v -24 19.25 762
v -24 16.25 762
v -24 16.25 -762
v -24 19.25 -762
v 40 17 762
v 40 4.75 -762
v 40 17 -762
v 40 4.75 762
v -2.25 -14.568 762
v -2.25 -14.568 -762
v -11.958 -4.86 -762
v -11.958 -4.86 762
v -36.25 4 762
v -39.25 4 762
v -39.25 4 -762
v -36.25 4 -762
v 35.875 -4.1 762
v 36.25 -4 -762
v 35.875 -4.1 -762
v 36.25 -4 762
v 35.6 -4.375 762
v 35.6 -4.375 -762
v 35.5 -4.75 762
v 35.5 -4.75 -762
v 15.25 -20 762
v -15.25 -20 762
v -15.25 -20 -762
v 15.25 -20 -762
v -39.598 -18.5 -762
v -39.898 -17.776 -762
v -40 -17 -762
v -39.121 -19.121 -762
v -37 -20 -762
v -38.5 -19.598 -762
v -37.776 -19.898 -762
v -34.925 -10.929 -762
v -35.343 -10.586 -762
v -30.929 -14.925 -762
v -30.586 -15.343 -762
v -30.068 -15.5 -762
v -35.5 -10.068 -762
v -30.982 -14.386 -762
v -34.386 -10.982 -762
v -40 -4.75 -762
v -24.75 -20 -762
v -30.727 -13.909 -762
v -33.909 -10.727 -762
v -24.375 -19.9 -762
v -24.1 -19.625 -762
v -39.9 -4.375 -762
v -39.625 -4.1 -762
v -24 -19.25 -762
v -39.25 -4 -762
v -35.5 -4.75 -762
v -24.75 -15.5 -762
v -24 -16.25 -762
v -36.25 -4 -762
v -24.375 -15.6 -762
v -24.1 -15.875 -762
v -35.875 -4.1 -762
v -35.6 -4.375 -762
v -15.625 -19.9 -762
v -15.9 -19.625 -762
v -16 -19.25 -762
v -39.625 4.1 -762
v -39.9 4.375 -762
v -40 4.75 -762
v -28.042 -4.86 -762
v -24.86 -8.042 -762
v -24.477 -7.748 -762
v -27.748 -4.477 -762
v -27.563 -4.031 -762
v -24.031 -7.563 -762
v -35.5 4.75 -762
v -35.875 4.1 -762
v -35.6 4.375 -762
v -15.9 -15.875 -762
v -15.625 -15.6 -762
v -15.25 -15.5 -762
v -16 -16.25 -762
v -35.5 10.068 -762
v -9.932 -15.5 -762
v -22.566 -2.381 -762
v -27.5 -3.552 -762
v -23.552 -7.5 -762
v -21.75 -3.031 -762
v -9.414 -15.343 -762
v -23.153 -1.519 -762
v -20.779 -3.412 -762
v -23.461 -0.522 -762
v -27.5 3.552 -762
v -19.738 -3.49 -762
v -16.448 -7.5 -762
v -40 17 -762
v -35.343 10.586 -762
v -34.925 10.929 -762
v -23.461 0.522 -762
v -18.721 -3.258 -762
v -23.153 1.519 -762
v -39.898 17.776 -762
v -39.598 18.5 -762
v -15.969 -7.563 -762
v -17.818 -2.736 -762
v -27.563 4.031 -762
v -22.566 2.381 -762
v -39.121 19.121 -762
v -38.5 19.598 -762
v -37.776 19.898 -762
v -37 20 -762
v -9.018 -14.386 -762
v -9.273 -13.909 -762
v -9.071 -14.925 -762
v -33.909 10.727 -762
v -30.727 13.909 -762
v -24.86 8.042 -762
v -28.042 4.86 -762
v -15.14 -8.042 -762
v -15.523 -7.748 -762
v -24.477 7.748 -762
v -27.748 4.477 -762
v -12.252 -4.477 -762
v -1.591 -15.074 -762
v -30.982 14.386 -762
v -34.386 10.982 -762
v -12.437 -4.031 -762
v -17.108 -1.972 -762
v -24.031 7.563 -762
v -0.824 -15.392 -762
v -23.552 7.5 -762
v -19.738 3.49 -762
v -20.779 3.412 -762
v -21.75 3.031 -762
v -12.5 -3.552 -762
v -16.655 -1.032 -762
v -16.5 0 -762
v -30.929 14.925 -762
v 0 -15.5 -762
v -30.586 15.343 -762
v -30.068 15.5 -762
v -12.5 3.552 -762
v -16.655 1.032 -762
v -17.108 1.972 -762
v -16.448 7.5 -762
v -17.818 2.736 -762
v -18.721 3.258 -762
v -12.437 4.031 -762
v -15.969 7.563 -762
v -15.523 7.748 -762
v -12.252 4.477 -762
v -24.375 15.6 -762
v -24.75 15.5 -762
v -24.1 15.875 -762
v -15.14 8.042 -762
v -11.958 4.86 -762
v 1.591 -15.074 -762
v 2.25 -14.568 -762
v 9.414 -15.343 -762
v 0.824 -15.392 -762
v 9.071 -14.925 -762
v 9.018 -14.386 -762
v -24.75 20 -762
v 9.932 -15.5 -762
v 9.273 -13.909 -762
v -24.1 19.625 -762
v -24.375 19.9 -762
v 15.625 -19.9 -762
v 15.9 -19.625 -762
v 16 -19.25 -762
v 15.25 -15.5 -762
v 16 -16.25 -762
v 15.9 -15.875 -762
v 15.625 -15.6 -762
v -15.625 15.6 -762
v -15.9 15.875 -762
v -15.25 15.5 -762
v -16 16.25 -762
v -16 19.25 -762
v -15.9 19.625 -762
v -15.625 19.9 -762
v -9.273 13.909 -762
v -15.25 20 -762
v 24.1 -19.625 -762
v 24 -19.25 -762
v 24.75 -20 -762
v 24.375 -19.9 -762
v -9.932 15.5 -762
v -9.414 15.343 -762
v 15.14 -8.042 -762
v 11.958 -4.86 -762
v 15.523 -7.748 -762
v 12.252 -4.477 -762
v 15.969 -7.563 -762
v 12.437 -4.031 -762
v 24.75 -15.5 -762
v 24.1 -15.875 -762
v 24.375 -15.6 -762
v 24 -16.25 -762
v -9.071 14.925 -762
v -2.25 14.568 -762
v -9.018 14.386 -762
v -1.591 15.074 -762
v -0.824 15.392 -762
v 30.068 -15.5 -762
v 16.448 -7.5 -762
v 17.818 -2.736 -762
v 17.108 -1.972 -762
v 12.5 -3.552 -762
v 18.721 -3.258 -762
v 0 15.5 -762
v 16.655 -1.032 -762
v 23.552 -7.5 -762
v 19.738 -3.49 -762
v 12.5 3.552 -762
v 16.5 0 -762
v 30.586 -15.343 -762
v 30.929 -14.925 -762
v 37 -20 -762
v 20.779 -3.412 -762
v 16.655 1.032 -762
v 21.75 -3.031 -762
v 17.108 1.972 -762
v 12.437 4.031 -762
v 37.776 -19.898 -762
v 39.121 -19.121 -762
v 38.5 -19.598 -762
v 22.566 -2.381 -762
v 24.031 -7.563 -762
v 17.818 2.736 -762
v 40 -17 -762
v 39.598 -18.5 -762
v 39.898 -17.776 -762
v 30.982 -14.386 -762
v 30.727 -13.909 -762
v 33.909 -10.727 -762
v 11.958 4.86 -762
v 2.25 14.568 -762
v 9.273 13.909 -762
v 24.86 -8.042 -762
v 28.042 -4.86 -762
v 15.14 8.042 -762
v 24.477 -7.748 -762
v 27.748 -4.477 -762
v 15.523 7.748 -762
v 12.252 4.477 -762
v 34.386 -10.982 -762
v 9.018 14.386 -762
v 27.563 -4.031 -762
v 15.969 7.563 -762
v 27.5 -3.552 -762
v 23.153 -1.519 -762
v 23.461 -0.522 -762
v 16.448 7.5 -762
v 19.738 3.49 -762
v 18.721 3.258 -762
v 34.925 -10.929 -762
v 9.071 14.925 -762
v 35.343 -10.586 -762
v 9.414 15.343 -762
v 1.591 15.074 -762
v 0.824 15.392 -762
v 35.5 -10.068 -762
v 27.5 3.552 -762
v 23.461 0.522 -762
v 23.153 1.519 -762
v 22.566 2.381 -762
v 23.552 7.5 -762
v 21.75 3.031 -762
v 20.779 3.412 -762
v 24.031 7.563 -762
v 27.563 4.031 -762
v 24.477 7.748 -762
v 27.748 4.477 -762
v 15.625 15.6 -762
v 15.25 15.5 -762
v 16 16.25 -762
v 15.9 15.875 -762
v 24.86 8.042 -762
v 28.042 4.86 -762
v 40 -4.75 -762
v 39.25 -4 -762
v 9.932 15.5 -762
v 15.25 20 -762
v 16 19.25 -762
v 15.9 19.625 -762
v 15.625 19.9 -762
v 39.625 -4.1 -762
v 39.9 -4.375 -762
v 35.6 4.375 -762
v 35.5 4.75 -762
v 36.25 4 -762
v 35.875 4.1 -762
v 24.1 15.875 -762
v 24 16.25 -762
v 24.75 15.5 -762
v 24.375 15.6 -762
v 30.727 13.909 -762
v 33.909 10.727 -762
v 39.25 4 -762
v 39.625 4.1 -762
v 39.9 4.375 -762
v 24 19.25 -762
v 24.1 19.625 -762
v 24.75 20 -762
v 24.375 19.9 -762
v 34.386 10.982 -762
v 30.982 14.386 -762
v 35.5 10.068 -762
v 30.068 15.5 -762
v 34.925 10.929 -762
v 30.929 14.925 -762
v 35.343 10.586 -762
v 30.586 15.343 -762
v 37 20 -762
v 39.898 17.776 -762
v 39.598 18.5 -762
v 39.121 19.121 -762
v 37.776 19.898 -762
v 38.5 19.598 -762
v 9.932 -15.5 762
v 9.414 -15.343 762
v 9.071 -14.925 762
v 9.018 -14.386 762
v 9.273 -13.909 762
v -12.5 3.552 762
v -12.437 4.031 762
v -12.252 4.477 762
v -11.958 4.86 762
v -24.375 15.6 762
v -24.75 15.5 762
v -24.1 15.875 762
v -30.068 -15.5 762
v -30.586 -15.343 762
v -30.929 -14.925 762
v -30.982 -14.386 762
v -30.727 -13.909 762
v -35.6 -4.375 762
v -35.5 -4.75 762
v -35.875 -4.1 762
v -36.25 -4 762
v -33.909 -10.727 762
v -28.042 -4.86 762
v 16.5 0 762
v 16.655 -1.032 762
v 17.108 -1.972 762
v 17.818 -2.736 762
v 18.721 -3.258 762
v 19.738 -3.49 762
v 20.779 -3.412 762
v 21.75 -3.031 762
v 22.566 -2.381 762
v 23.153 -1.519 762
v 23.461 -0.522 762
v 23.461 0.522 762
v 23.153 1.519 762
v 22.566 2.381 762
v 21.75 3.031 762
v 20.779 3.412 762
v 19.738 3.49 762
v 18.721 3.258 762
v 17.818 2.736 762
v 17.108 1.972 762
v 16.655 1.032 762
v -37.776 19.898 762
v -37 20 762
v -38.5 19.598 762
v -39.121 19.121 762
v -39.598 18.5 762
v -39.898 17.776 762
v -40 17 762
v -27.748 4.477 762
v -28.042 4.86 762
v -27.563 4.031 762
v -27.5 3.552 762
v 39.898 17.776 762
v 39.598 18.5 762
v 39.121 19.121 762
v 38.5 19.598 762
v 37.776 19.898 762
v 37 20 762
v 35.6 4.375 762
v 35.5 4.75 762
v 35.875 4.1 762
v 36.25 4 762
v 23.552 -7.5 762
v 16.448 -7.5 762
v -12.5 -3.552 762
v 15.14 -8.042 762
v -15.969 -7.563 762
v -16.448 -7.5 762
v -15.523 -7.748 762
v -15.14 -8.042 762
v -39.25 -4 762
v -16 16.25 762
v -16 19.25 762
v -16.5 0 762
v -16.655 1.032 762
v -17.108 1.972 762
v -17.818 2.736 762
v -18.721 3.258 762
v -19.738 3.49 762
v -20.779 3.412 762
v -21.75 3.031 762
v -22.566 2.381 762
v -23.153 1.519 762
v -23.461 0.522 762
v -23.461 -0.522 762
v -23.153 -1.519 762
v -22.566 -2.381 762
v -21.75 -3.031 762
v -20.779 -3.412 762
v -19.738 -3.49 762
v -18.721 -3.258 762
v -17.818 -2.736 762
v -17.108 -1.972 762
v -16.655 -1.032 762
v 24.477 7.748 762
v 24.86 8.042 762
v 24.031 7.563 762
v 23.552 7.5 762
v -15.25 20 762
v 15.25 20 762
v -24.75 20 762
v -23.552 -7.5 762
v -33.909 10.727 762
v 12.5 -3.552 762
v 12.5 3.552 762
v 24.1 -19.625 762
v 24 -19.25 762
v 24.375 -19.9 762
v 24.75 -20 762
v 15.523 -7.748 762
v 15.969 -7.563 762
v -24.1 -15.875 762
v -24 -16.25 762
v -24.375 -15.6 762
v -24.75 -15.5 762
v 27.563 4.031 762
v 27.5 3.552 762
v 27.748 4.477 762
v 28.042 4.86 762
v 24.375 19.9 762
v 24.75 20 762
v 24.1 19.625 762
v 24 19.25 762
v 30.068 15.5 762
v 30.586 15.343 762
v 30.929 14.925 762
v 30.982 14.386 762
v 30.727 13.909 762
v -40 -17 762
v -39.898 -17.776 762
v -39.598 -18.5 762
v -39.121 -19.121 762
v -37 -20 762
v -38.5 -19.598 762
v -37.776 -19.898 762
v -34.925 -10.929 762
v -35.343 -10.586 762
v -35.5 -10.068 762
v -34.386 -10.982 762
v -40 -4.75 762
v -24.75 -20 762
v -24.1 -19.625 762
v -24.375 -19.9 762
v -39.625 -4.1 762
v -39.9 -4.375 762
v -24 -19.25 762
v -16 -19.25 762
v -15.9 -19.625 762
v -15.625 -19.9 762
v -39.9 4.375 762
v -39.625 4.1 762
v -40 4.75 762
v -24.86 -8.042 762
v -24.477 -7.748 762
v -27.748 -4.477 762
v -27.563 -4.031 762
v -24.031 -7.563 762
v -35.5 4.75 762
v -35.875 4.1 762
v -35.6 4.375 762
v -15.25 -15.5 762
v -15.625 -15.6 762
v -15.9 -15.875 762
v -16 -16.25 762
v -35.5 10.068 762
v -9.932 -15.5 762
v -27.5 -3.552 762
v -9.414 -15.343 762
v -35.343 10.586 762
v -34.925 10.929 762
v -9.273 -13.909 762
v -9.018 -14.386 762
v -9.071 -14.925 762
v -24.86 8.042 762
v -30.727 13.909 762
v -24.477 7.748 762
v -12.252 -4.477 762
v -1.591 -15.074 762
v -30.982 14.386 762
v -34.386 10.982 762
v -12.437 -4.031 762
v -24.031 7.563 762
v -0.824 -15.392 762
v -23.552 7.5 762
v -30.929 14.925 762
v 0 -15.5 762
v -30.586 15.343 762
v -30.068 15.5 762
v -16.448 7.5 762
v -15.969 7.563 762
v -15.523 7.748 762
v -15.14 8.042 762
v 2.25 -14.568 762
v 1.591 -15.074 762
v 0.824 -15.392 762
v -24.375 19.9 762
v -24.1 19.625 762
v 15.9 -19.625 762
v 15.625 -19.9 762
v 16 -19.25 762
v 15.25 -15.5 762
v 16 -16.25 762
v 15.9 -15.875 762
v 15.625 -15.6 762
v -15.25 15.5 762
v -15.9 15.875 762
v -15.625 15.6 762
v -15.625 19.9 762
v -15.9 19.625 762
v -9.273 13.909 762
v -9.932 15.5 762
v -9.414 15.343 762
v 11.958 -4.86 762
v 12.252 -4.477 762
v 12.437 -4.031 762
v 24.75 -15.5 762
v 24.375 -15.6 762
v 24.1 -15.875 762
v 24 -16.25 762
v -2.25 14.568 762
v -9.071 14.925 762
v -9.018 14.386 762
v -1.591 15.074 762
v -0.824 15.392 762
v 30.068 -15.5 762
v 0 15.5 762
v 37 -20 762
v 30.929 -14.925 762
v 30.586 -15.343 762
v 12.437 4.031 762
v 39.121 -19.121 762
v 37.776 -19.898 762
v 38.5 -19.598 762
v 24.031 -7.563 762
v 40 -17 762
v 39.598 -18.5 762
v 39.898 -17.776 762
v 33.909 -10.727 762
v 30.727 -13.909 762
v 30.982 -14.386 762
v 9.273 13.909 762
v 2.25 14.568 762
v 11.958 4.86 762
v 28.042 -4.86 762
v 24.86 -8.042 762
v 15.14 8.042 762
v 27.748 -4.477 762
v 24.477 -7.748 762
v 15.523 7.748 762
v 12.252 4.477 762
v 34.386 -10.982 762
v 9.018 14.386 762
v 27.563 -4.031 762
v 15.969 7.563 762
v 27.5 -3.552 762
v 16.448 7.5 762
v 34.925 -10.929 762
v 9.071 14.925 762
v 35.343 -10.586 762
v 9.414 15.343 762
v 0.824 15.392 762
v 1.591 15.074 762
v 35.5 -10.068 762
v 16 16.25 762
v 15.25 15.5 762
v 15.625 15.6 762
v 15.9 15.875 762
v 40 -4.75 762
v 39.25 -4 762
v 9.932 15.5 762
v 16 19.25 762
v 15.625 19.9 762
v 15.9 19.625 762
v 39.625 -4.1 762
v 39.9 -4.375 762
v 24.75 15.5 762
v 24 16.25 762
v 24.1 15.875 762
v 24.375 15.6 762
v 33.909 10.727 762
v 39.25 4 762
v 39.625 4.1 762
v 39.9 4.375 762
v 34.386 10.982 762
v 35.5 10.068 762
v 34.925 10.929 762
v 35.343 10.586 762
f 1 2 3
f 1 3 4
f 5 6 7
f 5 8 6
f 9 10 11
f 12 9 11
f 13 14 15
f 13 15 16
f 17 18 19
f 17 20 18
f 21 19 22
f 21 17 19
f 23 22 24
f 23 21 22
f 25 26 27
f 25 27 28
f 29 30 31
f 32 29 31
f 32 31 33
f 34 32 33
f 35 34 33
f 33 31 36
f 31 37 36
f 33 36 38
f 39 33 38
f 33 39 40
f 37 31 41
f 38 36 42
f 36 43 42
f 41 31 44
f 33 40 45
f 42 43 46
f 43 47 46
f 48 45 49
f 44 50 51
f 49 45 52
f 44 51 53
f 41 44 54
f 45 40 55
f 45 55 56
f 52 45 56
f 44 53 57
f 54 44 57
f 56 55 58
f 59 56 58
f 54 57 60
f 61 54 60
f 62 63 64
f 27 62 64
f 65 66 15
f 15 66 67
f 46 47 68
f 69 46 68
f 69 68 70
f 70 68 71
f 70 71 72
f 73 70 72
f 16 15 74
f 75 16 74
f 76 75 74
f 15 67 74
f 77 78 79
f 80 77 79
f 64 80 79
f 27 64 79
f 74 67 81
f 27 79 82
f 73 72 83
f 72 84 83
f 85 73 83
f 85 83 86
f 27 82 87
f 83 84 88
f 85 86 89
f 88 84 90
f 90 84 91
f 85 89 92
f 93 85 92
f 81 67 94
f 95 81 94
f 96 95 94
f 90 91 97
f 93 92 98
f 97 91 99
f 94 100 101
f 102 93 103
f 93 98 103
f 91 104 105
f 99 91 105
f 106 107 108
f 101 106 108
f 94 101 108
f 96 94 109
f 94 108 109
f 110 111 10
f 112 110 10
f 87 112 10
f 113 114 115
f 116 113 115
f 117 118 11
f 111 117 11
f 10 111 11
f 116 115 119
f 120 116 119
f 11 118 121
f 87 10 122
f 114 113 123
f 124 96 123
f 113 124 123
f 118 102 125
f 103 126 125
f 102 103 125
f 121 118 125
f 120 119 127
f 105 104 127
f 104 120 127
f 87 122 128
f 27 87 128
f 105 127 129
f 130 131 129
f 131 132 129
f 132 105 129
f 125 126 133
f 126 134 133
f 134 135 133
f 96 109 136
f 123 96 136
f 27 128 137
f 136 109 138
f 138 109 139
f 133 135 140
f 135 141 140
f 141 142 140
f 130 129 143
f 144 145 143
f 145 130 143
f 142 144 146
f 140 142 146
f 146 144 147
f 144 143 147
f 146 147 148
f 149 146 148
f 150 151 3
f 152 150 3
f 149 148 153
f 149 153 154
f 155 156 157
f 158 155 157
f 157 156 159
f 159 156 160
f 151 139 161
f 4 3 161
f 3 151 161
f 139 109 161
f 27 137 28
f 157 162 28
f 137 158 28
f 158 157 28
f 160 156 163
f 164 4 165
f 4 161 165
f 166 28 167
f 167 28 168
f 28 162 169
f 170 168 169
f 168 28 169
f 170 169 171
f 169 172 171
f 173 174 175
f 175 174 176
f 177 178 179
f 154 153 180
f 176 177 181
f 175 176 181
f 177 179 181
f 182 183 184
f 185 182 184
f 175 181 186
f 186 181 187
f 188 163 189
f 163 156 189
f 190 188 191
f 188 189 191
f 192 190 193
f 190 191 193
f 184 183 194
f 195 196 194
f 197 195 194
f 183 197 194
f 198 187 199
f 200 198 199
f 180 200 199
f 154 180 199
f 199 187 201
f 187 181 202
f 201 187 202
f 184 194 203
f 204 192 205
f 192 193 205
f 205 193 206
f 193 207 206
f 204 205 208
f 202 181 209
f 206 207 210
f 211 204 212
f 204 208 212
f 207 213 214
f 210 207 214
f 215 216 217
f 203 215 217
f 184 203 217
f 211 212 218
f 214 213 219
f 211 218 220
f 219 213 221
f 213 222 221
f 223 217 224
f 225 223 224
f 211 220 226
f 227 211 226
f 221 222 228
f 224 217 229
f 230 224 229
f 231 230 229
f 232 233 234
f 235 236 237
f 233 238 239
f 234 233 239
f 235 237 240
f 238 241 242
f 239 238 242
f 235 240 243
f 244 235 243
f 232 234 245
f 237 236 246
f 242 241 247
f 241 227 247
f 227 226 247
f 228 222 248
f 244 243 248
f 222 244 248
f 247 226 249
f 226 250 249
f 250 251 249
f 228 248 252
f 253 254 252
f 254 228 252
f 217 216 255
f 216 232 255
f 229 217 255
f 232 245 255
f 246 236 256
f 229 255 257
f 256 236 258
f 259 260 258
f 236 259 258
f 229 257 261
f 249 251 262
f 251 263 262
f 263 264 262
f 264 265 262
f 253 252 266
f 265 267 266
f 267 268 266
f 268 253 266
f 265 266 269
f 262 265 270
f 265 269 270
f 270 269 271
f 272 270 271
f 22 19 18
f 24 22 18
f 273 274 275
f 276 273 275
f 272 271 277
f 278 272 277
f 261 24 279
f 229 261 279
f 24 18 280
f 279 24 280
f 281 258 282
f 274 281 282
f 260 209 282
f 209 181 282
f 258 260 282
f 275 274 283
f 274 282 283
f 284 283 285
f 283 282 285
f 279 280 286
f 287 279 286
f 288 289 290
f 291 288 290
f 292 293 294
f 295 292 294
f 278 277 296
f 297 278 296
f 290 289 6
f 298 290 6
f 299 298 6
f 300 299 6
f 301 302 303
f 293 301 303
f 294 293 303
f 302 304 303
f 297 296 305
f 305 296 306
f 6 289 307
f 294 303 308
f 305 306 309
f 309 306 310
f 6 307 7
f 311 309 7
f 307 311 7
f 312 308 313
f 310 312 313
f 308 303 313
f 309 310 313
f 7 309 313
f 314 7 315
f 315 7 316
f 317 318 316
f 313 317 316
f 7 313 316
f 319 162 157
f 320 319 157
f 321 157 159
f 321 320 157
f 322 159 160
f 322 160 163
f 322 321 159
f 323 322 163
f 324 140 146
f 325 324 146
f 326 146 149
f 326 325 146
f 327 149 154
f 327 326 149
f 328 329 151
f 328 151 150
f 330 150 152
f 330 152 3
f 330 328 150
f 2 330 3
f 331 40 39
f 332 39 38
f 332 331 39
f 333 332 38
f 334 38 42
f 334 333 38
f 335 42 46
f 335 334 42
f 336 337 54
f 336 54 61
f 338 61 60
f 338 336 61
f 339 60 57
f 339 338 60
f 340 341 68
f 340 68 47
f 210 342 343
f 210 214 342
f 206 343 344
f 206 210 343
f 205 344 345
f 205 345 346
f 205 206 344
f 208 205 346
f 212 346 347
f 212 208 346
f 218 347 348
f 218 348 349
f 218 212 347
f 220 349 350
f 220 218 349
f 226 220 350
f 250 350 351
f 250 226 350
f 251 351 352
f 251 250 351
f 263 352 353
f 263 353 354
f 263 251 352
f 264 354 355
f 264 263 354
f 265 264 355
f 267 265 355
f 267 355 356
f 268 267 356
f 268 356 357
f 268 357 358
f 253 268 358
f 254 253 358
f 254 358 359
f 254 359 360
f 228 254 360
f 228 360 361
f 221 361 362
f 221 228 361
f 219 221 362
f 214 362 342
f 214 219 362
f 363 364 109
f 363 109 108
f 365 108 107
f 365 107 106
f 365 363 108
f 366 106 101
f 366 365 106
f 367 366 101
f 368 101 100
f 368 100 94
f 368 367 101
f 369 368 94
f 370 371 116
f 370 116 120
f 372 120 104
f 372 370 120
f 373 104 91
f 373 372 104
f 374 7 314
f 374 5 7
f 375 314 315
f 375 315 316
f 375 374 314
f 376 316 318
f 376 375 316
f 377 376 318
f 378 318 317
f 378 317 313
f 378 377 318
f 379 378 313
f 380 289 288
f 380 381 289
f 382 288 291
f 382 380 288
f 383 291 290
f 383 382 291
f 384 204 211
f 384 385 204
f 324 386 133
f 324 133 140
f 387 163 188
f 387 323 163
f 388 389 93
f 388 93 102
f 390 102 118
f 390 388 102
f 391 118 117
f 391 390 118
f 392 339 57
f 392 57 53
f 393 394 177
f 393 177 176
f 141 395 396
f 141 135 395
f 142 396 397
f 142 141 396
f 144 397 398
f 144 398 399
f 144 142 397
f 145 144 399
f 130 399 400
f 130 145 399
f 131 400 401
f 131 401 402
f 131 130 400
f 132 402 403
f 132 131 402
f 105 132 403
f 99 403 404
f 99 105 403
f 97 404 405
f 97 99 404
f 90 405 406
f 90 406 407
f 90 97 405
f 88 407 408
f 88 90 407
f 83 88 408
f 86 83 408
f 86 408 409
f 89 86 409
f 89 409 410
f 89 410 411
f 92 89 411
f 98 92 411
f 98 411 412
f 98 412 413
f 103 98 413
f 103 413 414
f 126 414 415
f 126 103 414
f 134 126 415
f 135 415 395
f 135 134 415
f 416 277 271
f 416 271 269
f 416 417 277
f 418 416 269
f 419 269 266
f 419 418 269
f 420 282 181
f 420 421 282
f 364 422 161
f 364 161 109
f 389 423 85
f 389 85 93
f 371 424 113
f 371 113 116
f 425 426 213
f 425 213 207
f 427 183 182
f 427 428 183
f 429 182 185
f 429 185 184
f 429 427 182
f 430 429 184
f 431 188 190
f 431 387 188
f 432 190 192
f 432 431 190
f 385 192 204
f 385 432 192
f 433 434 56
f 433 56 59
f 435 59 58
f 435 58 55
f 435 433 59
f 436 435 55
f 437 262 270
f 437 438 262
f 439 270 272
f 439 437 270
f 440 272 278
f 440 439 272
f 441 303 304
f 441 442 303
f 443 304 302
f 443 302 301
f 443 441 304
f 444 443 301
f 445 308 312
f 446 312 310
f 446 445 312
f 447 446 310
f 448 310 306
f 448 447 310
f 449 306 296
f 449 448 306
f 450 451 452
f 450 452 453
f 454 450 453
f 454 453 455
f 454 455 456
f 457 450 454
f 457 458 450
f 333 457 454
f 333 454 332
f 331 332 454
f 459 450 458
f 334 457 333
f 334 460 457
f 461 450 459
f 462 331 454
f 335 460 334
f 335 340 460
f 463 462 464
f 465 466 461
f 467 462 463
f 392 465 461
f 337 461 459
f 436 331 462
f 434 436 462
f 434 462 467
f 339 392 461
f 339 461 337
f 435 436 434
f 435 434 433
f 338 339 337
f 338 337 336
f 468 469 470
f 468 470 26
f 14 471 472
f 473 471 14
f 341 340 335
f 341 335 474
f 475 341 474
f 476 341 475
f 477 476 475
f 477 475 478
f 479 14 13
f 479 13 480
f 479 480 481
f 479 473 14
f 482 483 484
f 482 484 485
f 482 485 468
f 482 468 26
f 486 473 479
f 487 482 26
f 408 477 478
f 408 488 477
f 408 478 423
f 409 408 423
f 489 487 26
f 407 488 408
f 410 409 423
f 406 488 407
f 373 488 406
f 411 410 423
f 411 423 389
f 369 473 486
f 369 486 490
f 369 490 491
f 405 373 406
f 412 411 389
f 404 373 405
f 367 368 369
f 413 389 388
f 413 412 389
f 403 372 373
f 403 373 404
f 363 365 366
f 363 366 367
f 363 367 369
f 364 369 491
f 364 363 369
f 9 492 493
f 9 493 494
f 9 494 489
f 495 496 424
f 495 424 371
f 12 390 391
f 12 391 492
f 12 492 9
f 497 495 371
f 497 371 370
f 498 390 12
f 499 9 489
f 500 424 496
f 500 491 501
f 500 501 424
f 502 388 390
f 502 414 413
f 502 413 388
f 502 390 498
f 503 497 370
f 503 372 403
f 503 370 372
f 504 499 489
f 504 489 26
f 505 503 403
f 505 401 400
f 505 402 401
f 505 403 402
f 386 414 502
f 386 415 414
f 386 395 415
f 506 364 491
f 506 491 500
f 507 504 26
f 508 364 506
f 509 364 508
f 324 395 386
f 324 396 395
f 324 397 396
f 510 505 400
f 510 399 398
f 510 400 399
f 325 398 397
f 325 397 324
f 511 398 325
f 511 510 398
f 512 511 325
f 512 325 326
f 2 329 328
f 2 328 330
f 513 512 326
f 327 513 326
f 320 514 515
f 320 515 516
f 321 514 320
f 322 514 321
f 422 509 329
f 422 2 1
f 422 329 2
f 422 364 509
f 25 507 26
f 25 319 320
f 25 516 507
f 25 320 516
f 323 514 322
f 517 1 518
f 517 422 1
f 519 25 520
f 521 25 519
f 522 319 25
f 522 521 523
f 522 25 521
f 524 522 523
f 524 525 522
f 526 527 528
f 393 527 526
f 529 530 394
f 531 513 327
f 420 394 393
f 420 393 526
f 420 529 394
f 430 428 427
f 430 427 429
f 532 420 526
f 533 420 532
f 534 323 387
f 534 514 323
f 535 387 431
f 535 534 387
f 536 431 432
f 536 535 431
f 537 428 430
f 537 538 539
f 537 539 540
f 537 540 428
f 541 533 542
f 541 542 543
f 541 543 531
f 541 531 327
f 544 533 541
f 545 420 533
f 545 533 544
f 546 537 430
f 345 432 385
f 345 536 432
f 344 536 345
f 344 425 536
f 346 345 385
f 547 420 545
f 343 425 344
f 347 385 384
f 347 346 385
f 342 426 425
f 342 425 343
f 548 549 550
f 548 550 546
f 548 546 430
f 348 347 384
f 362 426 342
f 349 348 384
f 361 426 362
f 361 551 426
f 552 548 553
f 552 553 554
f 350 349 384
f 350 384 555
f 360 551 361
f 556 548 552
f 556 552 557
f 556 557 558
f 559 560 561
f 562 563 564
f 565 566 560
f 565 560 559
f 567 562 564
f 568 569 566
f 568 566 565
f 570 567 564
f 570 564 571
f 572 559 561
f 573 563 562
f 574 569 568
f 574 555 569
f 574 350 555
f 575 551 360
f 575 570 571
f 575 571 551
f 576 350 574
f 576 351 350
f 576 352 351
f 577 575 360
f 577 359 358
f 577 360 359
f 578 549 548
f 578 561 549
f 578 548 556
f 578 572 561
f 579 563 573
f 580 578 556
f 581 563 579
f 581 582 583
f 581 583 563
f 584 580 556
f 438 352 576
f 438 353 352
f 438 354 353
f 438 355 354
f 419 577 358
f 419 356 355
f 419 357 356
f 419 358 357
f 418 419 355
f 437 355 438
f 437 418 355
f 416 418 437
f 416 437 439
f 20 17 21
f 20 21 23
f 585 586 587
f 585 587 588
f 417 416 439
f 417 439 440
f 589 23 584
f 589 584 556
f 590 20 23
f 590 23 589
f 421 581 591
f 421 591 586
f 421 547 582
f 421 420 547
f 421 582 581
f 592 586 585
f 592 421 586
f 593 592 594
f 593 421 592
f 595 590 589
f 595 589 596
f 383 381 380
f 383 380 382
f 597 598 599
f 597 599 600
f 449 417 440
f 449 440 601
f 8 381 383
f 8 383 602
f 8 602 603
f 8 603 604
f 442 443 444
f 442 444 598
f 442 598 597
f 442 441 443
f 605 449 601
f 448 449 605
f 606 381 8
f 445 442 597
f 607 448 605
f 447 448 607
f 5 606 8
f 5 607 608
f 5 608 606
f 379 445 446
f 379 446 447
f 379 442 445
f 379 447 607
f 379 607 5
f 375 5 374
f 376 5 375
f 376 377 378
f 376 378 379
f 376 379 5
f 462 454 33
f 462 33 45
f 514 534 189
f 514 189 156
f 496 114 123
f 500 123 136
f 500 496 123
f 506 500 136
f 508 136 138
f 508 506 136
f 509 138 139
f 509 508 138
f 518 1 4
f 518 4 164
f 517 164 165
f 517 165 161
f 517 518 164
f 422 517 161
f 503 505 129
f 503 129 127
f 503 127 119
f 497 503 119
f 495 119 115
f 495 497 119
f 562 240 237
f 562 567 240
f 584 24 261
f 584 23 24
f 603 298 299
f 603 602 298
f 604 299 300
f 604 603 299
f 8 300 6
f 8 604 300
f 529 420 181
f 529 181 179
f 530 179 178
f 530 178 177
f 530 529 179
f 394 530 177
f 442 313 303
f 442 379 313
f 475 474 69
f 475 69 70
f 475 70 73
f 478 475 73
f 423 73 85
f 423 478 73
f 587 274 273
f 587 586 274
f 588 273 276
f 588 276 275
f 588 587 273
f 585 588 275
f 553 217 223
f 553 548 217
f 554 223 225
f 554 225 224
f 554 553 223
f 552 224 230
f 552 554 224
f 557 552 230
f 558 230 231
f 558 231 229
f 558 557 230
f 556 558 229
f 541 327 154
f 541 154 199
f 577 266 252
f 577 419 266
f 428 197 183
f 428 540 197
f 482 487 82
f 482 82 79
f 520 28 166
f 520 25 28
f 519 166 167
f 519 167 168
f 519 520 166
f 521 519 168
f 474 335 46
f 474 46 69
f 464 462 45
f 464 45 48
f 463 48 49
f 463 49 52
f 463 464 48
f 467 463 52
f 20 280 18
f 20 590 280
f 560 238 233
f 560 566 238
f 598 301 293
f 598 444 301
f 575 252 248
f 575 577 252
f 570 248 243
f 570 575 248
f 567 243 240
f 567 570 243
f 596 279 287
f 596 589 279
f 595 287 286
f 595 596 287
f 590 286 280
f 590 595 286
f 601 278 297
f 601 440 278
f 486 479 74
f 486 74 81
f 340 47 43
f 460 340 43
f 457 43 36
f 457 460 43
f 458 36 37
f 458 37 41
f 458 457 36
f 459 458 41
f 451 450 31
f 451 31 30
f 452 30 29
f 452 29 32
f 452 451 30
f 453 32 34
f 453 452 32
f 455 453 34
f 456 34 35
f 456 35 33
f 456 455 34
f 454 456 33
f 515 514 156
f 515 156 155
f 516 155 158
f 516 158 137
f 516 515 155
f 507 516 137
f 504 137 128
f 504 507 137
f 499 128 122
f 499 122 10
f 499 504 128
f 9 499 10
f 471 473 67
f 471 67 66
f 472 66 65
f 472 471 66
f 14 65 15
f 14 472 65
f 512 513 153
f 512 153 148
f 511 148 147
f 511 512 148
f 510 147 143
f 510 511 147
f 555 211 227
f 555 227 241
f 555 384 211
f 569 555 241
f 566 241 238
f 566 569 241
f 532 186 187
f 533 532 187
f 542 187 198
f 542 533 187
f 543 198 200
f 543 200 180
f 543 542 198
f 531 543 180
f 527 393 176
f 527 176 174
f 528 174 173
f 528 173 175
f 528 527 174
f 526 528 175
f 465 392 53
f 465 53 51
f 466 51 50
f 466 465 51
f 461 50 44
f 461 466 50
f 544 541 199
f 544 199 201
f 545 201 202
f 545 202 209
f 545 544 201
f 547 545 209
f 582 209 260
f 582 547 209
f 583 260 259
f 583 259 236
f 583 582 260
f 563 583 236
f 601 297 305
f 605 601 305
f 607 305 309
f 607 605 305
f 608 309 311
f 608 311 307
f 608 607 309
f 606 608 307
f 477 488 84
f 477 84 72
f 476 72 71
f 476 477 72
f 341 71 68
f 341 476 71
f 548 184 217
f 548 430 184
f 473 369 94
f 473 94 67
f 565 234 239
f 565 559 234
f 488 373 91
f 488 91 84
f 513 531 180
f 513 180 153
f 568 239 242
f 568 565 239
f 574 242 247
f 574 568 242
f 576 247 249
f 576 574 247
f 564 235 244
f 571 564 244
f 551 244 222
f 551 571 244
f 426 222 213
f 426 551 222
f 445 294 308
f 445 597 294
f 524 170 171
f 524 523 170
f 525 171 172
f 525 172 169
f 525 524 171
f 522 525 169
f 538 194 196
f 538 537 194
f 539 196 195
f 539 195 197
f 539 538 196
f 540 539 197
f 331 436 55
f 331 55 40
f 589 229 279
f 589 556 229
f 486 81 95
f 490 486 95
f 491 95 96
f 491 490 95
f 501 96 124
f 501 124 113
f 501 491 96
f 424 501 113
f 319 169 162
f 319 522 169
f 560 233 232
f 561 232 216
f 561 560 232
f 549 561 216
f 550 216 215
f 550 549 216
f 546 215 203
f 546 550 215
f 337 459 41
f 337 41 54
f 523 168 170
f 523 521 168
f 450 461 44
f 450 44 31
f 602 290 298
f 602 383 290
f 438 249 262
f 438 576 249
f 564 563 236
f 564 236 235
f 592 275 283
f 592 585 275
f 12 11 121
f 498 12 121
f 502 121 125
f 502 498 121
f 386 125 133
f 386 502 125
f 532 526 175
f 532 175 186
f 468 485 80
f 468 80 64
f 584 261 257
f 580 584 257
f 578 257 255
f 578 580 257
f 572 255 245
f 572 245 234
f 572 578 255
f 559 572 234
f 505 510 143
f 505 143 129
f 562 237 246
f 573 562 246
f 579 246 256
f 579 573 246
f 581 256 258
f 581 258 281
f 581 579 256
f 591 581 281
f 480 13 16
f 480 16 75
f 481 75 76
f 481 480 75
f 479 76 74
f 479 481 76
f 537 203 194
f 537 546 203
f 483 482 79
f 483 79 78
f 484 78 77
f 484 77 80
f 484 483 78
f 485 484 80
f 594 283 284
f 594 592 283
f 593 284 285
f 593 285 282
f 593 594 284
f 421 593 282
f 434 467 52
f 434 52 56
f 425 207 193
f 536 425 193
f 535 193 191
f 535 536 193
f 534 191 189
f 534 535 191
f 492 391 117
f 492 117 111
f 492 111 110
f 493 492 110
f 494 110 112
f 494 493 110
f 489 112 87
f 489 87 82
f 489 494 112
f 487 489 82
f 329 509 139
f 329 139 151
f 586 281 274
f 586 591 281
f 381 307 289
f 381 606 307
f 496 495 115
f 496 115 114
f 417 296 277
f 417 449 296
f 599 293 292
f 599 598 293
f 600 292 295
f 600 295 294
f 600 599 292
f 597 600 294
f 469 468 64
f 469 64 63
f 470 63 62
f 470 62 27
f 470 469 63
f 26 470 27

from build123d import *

# Parameters (mm, degrees)
SKETCH3_R           = 3.5
BOSS_EXTRUDE1_DEPTH = 762


with BuildPart() as part:
    # Sketch3 → Boss-Extrude1 (new, symmetric)
    with BuildSketch(Plane.XY):
        with BuildLine():
            Line((15.25, 20), (-15.25, 20))
            ThreePointArc((-15.25, 20), (-15.780330086, 19.780330086), (-16, 19.25))
            Line((-16, 19.25), (-16, 16.25))
            ThreePointArc((-16, 16.25), (-15.780330086, 15.719669914), (-15.25, 15.5))
            Line((-15.25, 15.5), (-9.931980515, 15.5))
            ThreePointArc((-9.931980515, 15.5), (-9.070942793, 14.924672987), (-9.272970773, 13.909009742))
            Line((-9.272970773, 13.909009742), (-15.140128061, 8.041852455))
            ThreePointArc((-15.140128061, 8.041852455), (-15.740311256, 7.640822865), (-16.448275606, 7.5))
            Line((-16.448275606, 7.5), (-23.551724394, 7.5))
            ThreePointArc((-23.551724394, 7.5), (-24.259688744, 7.640822865), (-24.859871939, 8.041852455))
            Line((-24.859871939, 8.041852455), (-30.727029227, 13.909009742))
            ThreePointArc((-30.727029227, 13.909009742), (-30.929057207, 14.924672987), (-30.068019485, 15.5))
            Line((-30.068019485, 15.5), (-24.75, 15.5))
            ThreePointArc((-24.75, 15.5), (-24.219669914, 15.719669914), (-24, 16.25))
            Line((-24, 16.25), (-24, 19.25))
            ThreePointArc((-24, 19.25), (-24.219669914, 19.780330086), (-24.75, 20))
            Line((-24.75, 20), (-37, 20))
            ThreePointArc((-37, 20), (-39.121320344, 19.121320344), (-40, 17))
            Line((-40, 17), (-40, 4.75))
            ThreePointArc((-40, 4.75), (-39.780330086, 4.219669914), (-39.25, 4))
            Line((-39.25, 4), (-36.25, 4))
            ThreePointArc((-36.25, 4), (-35.719669914, 4.219669914), (-35.5, 4.75))
            Line((-35.5, 4.75), (-35.5, 10.068019485))
            ThreePointArc((-35.5, 10.068019485), (-34.924672987, 10.929057207), (-33.909009742, 10.727029227))
            Line((-33.909009742, 10.727029227), (-28.041852455, 4.859871939))
            ThreePointArc((-28.041852455, 4.859871939), (-27.640822865, 4.259688744), (-27.5, 3.551724394))
            Line((-27.5, 3.551724394), (-27.5, -3.551724394))
            ThreePointArc((-27.5, -3.551724394), (-27.640822865, -4.259688744), (-28.041852455, -4.859871939))
            Line((-28.041852455, -4.859871939), (-33.909009742, -10.727029227))
            ThreePointArc((-33.909009742, -10.727029227), (-34.924672987, -10.929057207), (-35.5, -10.068019485))
            Line((-35.5, -10.068019485), (-35.5, -4.75))
            ThreePointArc((-35.5, -4.75), (-35.719669914, -4.219669914), (-36.25, -4))
            Line((-36.25, -4), (-39.25, -4))
            ThreePointArc((-39.25, -4), (-39.780330086, -4.219669914), (-40, -4.75))
            Line((-40, -4.75), (-40, -17))
            ThreePointArc((-40, -17), (-39.121320344, -19.121320344), (-37, -20))
            Line((-37, -20), (-24.75, -20))
            ThreePointArc((-24.75, -20), (-24.219669914, -19.780330086), (-24, -19.25))
            Line((-24, -19.25), (-24, -16.25))
            ThreePointArc((-24, -16.25), (-24.219669914, -15.719669914), (-24.75, -15.5))
            Line((-24.75, -15.5), (-30.068019485, -15.5))
            ThreePointArc((-30.068019485, -15.5), (-30.929057207, -14.924672987), (-30.727029227, -13.909009742))
            Line((-30.727029227, -13.909009742), (-24.859871939, -8.041852455))
            ThreePointArc((-24.859871939, -8.041852455), (-24.259688744, -7.640822865), (-23.551724394, -7.5))
            Line((-23.551724394, -7.5), (-16.448275606, -7.5))
            ThreePointArc((-16.448275606, -7.5), (-15.740311256, -7.640822865), (-15.140128061, -8.041852455))
            Line((-15.140128061, -8.041852455), (-9.272970773, -13.909009742))
            ThreePointArc((-9.272970773, -13.909009742), (-9.070942793, -14.924672987), (-9.931980515, -15.5))
            Line((-9.931980515, -15.5), (-15.25, -15.5))
            ThreePointArc((-15.25, -15.5), (-15.780330086, -15.719669914), (-16, -16.25))
            Line((-16, -16.25), (-16, -19.25))
            ThreePointArc((-16, -19.25), (-15.780330086, -19.780330086), (-15.25, -20))
            Line((-15.25, -20), (15.25, -20))
            ThreePointArc((15.25, -20), (15.780330086, -19.780330086), (16, -19.25))
            Line((16, -19.25), (16, -16.25))
            ThreePointArc((16, -16.25), (15.780330086, -15.719669914), (15.25, -15.5))
            Line((15.25, -15.5), (9.931980515, -15.5))
            ThreePointArc((9.931980515, -15.5), (9.070942793, -14.924672987), (9.272970773, -13.909009742))
            Line((9.272970773, -13.909009742), (15.140128061, -8.041852455))
            ThreePointArc((15.140128061, -8.041852455), (15.740311256, -7.640822865), (16.448275606, -7.5))
            Line((16.448275606, -7.5), (23.551724394, -7.5))
            ThreePointArc((23.551724394, -7.5), (24.259688744, -7.640822865), (24.859871939, -8.041852455))
            Line((24.859871939, -8.041852455), (30.727029227, -13.909009742))
            ThreePointArc((30.727029227, -13.909009742), (30.929057207, -14.924672987), (30.068019485, -15.5))
            Line((30.068019485, -15.5), (24.75, -15.5))
            ThreePointArc((24.75, -15.5), (24.219669914, -15.719669914), (24, -16.25))
            Line((24, -16.25), (24, -19.25))
            ThreePointArc((24, -19.25), (24.219669914, -19.780330086), (24.75, -20))
            Line((24.75, -20), (37, -20))
            ThreePointArc((37, -20), (39.121320344, -19.121320344), (40, -17))
            Line((40, -17), (40, -4.75))
            ThreePointArc((40, -4.75), (39.780330086, -4.219669914), (39.25, -4))
            Line((39.25, -4), (36.25, -4))
            ThreePointArc((36.25, -4), (35.719669914, -4.219669914), (35.5, -4.75))
            Line((35.5, -4.75), (35.5, -10.068019485))
            ThreePointArc((35.5, -10.068019485), (34.924672987, -10.929057207), (33.909009742, -10.727029227))
            Line((33.909009742, -10.727029227), (28.041852455, -4.859871939))
            ThreePointArc((28.041852455, -4.859871939), (27.640822865, -4.259688744), (27.5, -3.551724394))
            Line((27.5, -3.551724394), (27.5, 3.551724394))
            ThreePointArc((27.5, 3.551724394), (27.640822865, 4.259688744), (28.041852455, 4.859871939))
            Line((28.041852455, 4.859871939), (33.909009742, 10.727029227))
            ThreePointArc((33.909009742, 10.727029227), (34.924672987, 10.929057207), (35.5, 10.068019485))
            Line((35.5, 10.068019485), (35.5, 4.75))
            ThreePointArc((35.5, 4.75), (35.719669914, 4.219669914), (36.25, 4))
            Line((36.25, 4), (39.25, 4))
            ThreePointArc((39.25, 4), (39.780330086, 4.219669914), (40, 4.75))
            Line((40, 4.75), (40, 17))
            ThreePointArc((40, 17), (39.121320344, 19.121320344), (37, 20))
            Line((37, 20), (24.75, 20))
            ThreePointArc((24.75, 20), (24.219669914, 19.780330086), (24, 19.25))
            Line((24, 19.25), (24, 16.25))
            ThreePointArc((24, 16.25), (24.219669914, 15.719669914), (24.75, 15.5))
            Line((24.75, 15.5), (30.068019485, 15.5))
            ThreePointArc((30.068019485, 15.5), (30.929057207, 14.924672987), (30.727029227, 13.909009742))
            Line((30.727029227, 13.909009742), (24.859871939, 8.041852455))
            ThreePointArc((24.859871939, 8.041852455), (24.259688744, 7.640822865), (23.551724394, 7.5))
            Line((23.551724394, 7.5), (16.448275606, 7.5))
            ThreePointArc((16.448275606, 7.5), (15.740311256, 7.640822865), (15.140128061, 8.041852455))
            Line((15.140128061, 8.041852455), (9.272970773, 13.909009742))
            ThreePointArc((9.272970773, 13.909009742), (9.070942793, 14.924672987), (9.931980515, 15.5))
            Line((9.931980515, 15.5), (15.25, 15.5))
            ThreePointArc((15.25, 15.5), (15.780330086, 15.719669914), (16, 16.25))
            Line((16, 16.25), (16, 19.25))
            ThreePointArc((16, 19.25), (15.780330086, 19.780330086), (15.25, 20))
        make_face()
        with Locations((-20, 0)):
            Circle(SKETCH3_R, mode=Mode.SUBTRACT)
        with Locations(Location((20, 0, 0), (0, 0, 180))):
            Circle(SKETCH3_R, mode=Mode.SUBTRACT)
        with BuildLine():
            Line((-2.25, -14.568019485), (-11.958147545, -4.859871939))
            ThreePointArc((-11.958147545, -4.859871939), (-12.359177135, -4.259688744), (-12.5, -3.551724394))
            Line((-12.5, -3.551724394), (-12.5, 3.551724394))
            ThreePointArc((-12.5, 3.551724394), (-12.359177135, 4.259688744), (-11.958147545, 4.859871939))
            Line((-11.958147545, 4.859871939), (-2.25, 14.568019485))
            ThreePointArc((-2.25, 14.568019485), (0, 15.5), (2.25, 14.568019485))
            Line((2.25, 14.568019485), (11.958147545, 4.859871939))
            ThreePointArc((11.958147545, 4.859871939), (12.359177135, 4.259688744), (12.5, 3.551724394))
            Line((12.5, 3.551724394), (12.5, -3.551724394))
            ThreePointArc((12.5, -3.551724394), (12.359177135, -4.259688744), (11.958147545, -4.859871939))
            Line((11.958147545, -4.859871939), (2.25, -14.568019485))
            ThreePointArc((2.25, -14.568019485), (0, -15.5), (-2.25, -14.568019485))
        make_face(mode=Mode.SUBTRACT)
    extrude(amount=BOSS_EXTRUDE1_DEPTH, both=True)


solid = part.part
